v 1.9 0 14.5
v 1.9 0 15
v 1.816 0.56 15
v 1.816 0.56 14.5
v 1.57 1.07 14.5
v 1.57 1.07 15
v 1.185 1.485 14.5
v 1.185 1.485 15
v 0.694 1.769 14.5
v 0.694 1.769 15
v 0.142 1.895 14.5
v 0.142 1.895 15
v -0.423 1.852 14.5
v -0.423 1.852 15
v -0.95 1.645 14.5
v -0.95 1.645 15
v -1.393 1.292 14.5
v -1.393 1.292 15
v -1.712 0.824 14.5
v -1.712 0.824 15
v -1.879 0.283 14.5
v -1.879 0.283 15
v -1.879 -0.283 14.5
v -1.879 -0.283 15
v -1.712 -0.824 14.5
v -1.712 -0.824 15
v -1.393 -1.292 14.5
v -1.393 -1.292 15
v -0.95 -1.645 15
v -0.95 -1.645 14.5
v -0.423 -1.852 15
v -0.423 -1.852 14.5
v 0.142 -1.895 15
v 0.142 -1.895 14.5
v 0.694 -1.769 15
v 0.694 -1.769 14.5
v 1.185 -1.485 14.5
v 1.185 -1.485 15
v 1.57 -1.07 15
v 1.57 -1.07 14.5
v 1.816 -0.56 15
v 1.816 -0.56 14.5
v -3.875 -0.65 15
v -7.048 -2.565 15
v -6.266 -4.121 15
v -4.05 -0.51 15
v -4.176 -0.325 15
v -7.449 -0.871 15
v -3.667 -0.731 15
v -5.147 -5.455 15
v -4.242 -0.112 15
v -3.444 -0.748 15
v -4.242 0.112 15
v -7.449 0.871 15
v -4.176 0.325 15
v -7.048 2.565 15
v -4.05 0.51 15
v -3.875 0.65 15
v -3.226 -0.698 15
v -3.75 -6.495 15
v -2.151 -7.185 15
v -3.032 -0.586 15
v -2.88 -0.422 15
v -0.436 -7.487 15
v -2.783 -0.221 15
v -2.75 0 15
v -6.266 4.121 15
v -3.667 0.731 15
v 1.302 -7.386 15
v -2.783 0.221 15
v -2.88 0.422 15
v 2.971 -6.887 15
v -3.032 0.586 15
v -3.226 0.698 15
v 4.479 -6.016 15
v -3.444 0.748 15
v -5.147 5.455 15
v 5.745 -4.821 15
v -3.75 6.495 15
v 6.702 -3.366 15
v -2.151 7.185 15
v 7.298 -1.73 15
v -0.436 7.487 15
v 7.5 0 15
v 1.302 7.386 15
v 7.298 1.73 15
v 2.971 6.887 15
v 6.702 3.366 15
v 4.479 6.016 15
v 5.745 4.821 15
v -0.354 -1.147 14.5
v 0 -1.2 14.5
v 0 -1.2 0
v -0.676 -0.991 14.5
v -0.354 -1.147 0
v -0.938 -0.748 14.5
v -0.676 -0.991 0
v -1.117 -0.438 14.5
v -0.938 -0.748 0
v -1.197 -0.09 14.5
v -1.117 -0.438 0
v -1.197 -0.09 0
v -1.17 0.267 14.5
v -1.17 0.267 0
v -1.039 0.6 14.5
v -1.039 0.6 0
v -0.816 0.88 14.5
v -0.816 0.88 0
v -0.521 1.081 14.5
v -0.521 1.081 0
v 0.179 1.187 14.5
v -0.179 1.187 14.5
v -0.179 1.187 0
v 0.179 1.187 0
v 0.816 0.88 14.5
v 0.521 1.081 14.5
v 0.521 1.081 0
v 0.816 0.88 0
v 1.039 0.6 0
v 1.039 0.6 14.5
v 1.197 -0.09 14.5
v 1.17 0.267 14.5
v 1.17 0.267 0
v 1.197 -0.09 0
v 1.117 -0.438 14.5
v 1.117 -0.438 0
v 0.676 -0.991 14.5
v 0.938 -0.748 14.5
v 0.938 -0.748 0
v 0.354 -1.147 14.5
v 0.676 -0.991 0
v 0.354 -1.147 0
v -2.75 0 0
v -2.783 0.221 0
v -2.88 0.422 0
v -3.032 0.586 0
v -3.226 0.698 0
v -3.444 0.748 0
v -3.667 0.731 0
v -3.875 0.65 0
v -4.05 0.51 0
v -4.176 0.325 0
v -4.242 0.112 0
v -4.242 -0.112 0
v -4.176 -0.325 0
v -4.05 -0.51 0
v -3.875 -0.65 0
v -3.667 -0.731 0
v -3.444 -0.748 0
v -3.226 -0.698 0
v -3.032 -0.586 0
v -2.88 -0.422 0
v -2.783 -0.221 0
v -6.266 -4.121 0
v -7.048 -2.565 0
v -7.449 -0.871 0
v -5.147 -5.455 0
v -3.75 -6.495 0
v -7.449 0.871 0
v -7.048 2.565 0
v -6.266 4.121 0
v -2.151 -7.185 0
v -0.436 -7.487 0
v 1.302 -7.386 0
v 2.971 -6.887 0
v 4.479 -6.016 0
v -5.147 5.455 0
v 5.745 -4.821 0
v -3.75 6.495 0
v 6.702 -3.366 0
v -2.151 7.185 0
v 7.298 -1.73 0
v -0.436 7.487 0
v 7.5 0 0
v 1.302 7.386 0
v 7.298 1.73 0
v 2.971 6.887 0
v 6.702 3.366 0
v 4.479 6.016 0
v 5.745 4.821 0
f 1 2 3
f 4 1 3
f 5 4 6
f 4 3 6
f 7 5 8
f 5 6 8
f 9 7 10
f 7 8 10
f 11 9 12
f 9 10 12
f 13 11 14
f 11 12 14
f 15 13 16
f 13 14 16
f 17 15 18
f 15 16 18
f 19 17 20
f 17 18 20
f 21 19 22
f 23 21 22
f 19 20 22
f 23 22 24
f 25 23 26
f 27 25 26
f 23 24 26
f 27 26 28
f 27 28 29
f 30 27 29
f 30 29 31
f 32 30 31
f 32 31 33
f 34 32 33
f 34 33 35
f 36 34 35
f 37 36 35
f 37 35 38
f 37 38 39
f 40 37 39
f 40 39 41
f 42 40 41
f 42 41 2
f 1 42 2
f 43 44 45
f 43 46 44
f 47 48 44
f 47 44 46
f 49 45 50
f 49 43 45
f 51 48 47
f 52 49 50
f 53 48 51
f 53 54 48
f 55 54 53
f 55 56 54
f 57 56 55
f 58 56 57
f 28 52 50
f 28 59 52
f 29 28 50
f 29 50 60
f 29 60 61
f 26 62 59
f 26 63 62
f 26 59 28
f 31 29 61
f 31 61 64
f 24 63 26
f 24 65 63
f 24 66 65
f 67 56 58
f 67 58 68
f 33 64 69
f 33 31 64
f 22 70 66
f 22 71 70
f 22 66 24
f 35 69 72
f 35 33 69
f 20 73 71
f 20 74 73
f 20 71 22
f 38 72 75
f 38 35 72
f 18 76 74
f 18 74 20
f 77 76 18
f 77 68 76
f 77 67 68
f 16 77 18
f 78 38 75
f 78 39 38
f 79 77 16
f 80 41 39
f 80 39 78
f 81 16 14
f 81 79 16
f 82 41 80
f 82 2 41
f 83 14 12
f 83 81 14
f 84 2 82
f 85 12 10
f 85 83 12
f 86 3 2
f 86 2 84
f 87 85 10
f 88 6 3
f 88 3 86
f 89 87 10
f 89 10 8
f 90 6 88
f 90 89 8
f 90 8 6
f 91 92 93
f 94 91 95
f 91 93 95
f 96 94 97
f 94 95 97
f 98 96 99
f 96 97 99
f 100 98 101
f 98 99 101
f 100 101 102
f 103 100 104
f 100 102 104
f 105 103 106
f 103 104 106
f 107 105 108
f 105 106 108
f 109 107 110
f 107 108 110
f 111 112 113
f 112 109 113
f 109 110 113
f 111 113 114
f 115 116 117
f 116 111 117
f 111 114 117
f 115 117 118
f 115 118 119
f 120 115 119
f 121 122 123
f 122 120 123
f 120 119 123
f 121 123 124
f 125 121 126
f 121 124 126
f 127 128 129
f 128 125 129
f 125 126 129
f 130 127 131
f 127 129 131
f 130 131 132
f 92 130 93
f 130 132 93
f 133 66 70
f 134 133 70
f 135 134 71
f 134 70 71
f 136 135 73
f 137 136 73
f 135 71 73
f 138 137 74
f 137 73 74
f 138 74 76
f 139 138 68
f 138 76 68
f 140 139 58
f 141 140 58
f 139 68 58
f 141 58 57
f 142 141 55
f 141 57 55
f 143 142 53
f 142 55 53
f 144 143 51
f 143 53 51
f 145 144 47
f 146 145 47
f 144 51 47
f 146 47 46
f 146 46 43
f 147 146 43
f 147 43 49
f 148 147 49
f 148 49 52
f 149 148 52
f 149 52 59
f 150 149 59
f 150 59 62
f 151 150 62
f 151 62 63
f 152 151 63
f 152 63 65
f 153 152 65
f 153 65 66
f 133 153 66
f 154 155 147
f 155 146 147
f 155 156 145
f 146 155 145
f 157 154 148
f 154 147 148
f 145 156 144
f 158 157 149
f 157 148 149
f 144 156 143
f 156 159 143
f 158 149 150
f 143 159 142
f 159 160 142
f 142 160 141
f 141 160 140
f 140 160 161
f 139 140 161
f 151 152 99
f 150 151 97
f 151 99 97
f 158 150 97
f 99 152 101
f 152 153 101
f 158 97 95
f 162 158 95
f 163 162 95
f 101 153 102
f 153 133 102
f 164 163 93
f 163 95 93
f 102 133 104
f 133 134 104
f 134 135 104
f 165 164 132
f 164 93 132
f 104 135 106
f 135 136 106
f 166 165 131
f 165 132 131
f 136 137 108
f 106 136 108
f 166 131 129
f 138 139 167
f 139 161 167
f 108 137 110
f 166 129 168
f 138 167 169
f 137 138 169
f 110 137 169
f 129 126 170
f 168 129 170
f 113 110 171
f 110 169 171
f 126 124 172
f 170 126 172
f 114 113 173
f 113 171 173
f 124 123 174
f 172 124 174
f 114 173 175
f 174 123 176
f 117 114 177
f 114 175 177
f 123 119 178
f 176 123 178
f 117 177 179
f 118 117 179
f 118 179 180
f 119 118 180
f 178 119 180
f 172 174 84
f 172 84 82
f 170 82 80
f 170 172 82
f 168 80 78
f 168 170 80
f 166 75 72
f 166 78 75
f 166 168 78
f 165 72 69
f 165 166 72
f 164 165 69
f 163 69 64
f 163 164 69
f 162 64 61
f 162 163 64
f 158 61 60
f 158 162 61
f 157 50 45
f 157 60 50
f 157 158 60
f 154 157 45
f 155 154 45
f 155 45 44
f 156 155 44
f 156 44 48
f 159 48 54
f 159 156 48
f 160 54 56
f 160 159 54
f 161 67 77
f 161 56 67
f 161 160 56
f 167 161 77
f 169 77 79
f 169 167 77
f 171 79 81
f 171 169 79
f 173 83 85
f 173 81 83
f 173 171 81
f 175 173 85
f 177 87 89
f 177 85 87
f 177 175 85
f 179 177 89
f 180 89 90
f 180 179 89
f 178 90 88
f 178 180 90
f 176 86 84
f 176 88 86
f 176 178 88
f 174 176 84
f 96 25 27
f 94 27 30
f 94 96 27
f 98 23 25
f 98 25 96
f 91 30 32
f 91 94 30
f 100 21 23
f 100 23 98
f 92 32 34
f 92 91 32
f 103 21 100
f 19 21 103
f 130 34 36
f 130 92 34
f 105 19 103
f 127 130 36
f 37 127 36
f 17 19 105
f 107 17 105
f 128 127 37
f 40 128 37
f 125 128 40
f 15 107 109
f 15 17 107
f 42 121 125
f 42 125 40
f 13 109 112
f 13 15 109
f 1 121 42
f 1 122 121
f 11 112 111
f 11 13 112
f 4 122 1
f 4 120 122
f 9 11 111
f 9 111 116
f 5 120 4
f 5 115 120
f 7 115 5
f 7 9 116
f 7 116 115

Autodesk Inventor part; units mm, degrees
ref_plane "YZ Plane" through (0, 0, 0) normal (1, 0, 0) x (0, 1, 0)
ref_plane "XZ Plane" through (0, 0, 0) normal (0, 1, 0) x (-1, 0, 0)
ref_plane "XY Plane" through (0, 0, 0) normal (0, 0, 1) x (1, 0, 0)
sketch "Sketch1" plane through (0, 0, 0) normal (0, 0, 1) x (1, 0, 0)
  circle A0 centre (0, 0) radius 7.5
  dimension "d0" = 15
extrude "Extrusion1" add sketch "Sketch1" along normal blind 15
hole "Hole1" at (0, 0, 15) direction (0, 0, -1) diameter 2.4 end through all
sketch "Sketch3" plane through (0, 0, 15) normal (0, 0, 1) x (1, 0, 0)
  circle A0 centre (0, 0) radius 1.2 projected
  circle A1 centre (0, 0) radius 7.5 projected
  circle A2 centre (0, 0) radius 1.9
  dimension "d16" = 3.8
extrude "Extrusion3" cut sketch "Sketch3" against normal blind 0.5 contours A2
sketch "Sketch2" plane through (0, 0, 15) normal (0, 0, 1) x (1, 0, 0)
  circle A0 centre (0, 0) radius 1.2 projected
  circle A1 centre (-3.5, 0) radius 0.75
  dimension "d12" = 1.5
  dimension "d13" = 3.5
extrude "Extrusion2" cut sketch "Sketch2" against normal through all contours A1
properties part number "Jig_Bearing_OD_Asm"
